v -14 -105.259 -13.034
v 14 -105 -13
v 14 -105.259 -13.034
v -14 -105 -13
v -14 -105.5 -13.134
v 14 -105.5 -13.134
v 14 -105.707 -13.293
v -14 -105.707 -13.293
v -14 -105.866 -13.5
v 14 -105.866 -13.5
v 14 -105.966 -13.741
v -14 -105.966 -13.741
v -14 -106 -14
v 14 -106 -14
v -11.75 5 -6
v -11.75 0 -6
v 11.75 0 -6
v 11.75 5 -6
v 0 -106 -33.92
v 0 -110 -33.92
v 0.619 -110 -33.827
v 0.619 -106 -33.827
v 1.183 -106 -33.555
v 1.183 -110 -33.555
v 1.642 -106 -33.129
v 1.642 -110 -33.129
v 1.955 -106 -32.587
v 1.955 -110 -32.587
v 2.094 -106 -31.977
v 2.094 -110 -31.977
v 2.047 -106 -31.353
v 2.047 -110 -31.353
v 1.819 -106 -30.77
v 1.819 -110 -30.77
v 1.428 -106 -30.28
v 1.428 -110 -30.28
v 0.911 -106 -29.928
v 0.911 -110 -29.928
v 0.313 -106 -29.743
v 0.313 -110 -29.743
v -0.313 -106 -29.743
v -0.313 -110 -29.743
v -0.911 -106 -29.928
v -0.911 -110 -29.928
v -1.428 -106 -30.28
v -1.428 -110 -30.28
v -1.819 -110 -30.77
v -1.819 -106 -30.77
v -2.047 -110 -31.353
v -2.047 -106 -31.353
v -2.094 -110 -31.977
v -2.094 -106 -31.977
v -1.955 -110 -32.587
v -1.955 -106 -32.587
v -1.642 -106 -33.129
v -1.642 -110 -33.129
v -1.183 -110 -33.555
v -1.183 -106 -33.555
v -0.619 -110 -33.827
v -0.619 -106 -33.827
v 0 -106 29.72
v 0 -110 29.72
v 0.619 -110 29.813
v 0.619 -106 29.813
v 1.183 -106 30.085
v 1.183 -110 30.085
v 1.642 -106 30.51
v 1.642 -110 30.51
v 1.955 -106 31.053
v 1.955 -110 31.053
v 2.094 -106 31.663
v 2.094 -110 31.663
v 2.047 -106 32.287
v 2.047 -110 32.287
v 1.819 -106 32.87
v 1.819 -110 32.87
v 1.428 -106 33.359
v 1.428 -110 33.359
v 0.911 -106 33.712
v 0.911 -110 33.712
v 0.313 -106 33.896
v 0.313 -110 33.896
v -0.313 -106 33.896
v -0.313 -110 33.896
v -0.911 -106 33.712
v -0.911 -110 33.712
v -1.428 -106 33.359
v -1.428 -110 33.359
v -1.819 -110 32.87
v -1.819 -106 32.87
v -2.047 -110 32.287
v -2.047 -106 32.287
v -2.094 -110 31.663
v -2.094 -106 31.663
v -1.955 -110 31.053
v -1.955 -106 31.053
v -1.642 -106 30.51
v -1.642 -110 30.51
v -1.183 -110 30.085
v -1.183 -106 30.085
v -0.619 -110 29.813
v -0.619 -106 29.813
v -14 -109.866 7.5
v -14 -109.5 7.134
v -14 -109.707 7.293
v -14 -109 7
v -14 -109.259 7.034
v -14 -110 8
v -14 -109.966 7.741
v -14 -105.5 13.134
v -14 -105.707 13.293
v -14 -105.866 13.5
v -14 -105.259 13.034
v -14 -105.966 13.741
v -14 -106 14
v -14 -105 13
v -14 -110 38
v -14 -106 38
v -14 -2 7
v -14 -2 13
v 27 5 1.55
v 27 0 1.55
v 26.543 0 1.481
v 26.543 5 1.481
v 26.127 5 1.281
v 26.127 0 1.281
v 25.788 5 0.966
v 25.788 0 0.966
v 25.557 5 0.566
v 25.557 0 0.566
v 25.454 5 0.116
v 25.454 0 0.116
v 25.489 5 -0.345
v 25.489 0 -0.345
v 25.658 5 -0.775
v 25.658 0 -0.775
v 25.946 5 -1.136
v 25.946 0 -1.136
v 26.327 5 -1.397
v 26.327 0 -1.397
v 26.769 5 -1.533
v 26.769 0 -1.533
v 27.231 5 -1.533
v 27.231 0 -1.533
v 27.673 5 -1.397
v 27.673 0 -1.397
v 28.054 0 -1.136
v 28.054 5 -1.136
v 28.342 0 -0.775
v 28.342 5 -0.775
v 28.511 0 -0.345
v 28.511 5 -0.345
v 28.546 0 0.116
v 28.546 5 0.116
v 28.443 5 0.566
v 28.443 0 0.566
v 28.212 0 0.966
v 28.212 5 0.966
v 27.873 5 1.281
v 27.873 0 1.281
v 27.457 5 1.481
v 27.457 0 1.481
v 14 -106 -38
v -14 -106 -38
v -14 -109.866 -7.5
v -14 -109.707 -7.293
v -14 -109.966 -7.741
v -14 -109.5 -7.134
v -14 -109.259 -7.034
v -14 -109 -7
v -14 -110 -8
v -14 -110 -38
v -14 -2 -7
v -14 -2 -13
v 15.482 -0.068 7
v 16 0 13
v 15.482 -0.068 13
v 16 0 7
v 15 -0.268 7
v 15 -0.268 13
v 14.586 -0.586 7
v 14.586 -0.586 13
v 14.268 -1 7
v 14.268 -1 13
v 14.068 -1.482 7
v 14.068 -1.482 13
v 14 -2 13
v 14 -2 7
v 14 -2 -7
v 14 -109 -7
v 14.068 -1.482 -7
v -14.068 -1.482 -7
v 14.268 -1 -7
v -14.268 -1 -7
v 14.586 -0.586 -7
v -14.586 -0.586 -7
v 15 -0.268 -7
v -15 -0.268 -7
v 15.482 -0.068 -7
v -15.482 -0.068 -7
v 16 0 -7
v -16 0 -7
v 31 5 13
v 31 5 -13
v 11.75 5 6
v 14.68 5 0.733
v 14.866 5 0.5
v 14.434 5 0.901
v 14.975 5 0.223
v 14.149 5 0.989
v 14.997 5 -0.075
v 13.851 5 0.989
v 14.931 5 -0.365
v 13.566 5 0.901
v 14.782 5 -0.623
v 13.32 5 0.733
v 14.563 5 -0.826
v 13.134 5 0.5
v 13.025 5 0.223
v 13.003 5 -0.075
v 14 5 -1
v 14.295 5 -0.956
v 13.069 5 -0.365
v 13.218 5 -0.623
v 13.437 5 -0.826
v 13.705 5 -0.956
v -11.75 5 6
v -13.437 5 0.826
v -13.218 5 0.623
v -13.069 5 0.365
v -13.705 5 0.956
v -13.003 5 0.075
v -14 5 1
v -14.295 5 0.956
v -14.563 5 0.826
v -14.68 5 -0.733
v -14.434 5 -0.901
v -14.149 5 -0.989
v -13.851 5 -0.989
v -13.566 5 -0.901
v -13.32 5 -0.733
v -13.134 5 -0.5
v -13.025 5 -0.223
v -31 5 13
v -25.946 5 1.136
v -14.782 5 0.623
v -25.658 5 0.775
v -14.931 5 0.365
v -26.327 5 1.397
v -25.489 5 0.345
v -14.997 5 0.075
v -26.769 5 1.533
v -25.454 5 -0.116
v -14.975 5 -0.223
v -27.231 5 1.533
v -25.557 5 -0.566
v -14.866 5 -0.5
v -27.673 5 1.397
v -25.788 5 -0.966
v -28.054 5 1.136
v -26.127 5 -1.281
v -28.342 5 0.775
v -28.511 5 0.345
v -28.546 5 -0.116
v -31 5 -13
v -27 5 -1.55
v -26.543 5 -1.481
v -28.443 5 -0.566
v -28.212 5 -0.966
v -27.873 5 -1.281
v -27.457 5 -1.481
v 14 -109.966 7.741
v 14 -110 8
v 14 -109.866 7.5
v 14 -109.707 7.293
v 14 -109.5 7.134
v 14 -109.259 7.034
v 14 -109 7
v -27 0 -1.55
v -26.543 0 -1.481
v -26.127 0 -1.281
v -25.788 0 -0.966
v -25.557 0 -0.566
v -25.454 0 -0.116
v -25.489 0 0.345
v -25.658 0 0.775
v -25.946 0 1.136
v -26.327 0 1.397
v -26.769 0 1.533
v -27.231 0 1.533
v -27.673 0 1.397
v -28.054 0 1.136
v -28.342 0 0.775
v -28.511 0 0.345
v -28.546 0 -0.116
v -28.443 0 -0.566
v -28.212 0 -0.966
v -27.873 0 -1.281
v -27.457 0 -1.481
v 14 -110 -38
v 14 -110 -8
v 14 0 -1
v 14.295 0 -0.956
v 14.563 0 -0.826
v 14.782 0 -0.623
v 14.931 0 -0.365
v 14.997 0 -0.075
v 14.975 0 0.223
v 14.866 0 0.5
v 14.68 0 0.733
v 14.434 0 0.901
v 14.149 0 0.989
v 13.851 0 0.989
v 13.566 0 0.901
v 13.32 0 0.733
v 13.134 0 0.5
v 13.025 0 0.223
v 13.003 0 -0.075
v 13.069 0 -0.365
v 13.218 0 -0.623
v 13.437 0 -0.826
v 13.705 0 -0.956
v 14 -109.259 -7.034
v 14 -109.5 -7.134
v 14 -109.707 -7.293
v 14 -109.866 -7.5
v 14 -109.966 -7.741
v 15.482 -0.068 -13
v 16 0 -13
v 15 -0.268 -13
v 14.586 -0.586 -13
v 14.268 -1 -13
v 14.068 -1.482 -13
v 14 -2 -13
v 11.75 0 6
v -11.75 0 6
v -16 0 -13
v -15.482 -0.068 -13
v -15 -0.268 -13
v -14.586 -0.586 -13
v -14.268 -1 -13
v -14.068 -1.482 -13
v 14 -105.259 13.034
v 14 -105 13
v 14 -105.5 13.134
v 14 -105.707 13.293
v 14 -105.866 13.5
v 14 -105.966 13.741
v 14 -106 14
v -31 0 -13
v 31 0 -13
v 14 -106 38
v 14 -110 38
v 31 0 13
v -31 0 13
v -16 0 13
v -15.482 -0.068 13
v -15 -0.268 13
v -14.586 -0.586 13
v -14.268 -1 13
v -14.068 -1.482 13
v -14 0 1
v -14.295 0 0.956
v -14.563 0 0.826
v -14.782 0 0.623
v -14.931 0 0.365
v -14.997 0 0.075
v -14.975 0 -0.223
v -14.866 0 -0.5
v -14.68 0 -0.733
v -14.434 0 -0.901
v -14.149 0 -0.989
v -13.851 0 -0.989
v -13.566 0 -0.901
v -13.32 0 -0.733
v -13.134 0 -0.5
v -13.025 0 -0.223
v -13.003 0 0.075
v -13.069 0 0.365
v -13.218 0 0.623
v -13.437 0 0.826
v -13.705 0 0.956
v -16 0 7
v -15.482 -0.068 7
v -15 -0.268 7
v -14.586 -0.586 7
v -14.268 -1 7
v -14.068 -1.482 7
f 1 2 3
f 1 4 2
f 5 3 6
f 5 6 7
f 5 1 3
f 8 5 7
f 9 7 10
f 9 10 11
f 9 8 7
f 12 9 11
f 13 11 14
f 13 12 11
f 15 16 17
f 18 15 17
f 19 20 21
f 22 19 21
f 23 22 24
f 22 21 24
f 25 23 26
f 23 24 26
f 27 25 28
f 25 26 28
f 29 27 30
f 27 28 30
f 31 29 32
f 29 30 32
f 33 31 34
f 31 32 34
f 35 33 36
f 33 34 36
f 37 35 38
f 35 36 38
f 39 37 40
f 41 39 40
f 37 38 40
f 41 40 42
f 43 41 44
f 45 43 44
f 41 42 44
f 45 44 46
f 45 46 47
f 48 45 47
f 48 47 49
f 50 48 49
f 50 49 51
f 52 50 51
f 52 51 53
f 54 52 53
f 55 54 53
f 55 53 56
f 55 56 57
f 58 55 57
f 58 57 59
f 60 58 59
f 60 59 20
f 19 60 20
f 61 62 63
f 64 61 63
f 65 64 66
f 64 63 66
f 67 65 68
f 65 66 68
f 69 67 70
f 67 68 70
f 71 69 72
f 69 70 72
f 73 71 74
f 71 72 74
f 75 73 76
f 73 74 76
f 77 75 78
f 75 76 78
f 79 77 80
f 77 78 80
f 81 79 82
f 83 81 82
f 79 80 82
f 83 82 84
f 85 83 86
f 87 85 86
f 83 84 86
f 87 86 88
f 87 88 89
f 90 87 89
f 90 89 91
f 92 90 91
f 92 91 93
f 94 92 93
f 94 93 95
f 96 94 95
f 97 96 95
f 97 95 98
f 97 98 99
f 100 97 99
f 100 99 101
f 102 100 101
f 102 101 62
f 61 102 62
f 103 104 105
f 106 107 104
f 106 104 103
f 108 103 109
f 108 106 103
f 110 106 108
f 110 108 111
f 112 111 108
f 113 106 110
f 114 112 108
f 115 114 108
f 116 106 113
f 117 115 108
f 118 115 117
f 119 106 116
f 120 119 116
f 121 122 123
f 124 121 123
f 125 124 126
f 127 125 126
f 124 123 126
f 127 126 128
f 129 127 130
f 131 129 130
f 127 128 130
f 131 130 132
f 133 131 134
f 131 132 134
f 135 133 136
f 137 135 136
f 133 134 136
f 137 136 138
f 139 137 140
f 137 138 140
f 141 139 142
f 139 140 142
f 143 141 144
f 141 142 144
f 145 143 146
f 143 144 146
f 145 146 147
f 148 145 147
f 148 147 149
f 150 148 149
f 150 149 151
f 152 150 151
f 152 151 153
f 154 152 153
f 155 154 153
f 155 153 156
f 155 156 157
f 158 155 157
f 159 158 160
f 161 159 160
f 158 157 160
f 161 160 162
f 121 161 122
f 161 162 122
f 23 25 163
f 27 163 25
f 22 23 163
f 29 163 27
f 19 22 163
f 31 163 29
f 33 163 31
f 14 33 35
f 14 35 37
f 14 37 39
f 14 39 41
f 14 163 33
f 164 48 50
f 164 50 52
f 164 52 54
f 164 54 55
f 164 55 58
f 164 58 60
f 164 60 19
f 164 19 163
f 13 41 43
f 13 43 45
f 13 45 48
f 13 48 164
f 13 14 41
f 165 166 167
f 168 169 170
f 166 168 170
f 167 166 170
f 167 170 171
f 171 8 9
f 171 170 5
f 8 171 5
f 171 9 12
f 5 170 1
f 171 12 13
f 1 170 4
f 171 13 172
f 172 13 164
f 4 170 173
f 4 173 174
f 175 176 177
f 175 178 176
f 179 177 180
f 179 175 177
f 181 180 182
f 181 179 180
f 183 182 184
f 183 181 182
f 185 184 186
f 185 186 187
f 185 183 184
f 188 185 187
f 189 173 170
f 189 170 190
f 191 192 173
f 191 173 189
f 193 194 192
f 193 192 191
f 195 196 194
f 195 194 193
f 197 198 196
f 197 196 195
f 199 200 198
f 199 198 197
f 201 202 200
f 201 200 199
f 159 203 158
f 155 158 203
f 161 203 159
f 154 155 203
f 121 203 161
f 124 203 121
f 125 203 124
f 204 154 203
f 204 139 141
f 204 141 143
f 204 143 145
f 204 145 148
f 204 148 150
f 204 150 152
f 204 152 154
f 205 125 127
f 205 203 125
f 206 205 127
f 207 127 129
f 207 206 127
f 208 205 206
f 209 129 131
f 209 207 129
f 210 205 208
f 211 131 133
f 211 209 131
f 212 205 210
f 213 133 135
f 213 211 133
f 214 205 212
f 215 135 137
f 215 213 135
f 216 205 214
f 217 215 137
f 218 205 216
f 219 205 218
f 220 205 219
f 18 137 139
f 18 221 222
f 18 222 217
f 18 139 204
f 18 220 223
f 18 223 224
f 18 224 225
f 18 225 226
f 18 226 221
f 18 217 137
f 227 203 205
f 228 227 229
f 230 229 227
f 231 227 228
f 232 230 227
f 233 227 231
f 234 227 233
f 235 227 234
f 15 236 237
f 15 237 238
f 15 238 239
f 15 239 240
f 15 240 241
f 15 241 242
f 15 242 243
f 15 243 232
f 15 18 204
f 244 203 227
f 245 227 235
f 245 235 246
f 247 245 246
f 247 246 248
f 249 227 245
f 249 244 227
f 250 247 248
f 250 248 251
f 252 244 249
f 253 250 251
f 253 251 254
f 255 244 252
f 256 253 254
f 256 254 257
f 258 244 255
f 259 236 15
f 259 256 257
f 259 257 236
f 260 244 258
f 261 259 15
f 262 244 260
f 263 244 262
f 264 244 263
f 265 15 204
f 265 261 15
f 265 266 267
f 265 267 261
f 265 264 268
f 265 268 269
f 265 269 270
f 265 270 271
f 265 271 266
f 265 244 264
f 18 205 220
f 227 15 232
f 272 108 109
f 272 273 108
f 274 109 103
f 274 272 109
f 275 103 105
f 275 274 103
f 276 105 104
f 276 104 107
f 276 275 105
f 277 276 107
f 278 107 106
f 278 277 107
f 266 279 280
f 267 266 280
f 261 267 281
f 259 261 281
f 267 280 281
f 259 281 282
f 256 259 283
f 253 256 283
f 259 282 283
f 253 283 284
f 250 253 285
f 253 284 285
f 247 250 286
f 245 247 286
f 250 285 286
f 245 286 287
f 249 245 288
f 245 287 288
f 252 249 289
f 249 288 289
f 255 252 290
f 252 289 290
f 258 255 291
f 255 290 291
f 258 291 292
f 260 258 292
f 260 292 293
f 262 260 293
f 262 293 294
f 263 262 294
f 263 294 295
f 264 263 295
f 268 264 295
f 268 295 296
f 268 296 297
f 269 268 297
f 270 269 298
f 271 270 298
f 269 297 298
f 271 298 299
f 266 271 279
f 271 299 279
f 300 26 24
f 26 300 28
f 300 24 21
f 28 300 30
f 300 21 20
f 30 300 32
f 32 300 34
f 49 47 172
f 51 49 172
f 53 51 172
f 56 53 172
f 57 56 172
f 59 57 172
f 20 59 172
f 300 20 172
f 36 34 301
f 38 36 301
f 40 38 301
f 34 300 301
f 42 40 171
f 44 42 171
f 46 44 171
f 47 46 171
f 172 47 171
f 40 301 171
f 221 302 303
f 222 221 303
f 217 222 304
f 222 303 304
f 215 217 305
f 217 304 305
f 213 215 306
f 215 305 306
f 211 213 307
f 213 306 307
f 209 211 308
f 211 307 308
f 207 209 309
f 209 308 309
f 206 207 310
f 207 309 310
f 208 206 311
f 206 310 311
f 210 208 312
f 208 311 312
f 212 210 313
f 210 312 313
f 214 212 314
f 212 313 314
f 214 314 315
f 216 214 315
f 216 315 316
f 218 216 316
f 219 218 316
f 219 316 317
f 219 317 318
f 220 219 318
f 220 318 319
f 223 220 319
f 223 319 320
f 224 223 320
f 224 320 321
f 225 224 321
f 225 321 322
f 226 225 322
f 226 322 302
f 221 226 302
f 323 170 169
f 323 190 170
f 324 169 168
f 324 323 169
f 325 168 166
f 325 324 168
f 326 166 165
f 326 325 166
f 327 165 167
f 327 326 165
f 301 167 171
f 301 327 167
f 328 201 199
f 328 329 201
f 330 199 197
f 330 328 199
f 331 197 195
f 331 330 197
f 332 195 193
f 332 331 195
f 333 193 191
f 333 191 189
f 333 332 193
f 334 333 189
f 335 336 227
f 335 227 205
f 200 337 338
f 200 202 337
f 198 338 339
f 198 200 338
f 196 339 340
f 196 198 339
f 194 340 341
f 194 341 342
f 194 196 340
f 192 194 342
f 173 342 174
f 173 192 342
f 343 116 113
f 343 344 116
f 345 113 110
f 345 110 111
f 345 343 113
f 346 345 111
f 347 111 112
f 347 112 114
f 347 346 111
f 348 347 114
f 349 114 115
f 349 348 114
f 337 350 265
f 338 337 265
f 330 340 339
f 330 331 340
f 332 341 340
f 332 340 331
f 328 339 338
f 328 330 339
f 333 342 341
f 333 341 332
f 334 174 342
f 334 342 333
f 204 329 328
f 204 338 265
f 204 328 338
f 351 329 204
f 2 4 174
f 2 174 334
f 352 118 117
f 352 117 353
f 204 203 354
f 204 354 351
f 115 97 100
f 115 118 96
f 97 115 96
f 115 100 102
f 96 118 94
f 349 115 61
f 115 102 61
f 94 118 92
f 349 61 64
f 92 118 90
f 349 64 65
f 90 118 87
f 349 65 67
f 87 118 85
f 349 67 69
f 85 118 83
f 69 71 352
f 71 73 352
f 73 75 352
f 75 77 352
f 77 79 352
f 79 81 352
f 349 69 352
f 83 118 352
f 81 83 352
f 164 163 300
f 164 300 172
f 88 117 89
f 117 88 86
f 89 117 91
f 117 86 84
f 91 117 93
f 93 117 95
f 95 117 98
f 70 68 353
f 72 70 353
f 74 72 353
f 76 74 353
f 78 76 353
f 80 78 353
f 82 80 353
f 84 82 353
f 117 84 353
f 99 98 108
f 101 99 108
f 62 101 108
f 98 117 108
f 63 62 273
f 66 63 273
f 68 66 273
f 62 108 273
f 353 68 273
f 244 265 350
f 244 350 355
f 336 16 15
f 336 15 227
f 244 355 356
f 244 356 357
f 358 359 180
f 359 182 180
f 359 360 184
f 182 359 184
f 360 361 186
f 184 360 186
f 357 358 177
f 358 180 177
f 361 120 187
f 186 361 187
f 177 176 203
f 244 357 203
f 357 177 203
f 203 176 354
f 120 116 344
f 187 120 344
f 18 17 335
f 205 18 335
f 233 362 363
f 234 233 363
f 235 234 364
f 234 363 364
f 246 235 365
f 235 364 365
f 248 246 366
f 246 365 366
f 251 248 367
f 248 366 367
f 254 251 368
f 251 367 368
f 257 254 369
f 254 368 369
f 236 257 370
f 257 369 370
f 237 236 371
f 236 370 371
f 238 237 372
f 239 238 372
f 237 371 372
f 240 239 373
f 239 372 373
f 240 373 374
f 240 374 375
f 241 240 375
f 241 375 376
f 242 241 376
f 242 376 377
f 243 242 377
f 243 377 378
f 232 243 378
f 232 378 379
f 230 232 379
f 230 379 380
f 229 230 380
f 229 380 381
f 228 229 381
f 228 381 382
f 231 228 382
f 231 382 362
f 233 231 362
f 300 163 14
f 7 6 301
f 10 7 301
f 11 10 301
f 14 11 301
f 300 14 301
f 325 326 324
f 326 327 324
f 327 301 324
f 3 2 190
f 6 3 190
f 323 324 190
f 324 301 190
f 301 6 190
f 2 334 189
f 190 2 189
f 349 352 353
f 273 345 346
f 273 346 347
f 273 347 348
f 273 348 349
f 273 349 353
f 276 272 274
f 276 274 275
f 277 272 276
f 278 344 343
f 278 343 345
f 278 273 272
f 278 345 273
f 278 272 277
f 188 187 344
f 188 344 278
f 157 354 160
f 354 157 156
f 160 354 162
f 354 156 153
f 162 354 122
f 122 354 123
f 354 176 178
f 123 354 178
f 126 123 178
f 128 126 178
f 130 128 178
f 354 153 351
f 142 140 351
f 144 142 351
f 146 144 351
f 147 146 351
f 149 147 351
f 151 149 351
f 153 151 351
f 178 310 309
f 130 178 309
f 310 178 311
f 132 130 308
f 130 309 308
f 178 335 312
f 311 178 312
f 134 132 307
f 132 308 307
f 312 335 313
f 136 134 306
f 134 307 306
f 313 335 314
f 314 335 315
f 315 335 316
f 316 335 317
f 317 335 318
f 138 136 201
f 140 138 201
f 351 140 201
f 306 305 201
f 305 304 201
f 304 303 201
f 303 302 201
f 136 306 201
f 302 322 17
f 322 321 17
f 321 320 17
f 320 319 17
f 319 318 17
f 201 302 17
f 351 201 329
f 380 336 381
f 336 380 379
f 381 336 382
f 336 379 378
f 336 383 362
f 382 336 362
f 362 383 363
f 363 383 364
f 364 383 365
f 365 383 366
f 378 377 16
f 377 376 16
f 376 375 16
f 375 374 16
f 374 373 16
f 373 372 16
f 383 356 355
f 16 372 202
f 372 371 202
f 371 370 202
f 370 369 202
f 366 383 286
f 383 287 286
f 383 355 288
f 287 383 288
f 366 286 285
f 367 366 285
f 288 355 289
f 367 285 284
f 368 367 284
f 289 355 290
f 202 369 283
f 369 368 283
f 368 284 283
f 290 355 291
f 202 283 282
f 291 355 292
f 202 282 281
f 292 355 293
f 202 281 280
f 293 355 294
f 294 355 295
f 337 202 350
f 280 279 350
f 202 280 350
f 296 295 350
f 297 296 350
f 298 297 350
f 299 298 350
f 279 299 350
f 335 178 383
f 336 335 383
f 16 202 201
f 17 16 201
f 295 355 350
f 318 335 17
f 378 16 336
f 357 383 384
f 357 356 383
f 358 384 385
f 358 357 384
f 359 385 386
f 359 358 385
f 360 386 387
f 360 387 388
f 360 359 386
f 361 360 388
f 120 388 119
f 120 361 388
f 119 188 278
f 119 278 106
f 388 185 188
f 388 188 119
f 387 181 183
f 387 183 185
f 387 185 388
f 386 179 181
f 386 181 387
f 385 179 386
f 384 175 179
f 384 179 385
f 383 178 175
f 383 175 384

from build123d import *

# Parameters (mm, degrees)
SKETCH_1_W               = 36
SKETCH_1_H               = 30
EXTRUDE_1_DEPTH          = 5
SKETCH_11_W              = 36
SKETCH_11_H              = 8
EXTRUDE_3_DEPTH          = 110
SKETCH_12_W              = 36
SKETCH_12_H              = 8
EXTRUDE_4_DEPTH          = 4
SKETCH_17_W              = 36
SKETCH_17_H              = 5
EXTRUDE_5_DEPTH          = 8
SKETCH_18_W              = 36
SKETCH_18_H              = 5
EXTRUDE_6_DEPTH          = 8
SKETCH_20_W              = 36
SKETCH_20_H              = 4
EXTRUDE_7_DEPTH          = 15
SKETCH_21_W              = 36
SKETCH_21_H              = 4
EXTRUDE_8_DEPTH          = 15
CUT_EXTRUDE_8_REACH      = 124.446
SKETCH_22_R              = 2.1
CUT_EXTRUDE_9_REACH      = 124.446
SKETCH_23_R              = 1.55
CUT_EXTRUDE_10_REACH     = 119.762
SKETCH_26_R              = 1
SKETCH_26_W              = 23.5
SKETCH_26_H              = 12
CUT_EXTRUDE_11_DEPTH     = 2
CUT_EXTRUDE_12_DEPTH     = 2
CUT_EXTRUDE_13_DEPTH     = 2
CUT_EXTRUDE_14_DEPTH     = 2
SKETCH_32_W              = 28
SKETCH_32_H              = 106
CUT_EXTRUDE_15_DEPTH     = 2
SKETCH_33_W              = 28
SKETCH_33_H              = 106
CUT_EXTRUDE_16_DEPTH     = 2
FILLET_2_R               = 1
EXTRUDE_START            = 2
SKETCH_34_W              = 32
SKETCH_34_H              = 14.000594261
SKETCH_34_R              = 1
SKETCH_34_W_2            = 23.5
SKETCH_34_H_2            = 12
EXTRUDE_12_DEPTH         = 2
CUT_EXTRUDE_START        = -2
CUT_EXTRUDE_17_OUTLINE_R = 1
CUT_EXTRUDE_17_OUTLINE_W = 23.5
CUT_EXTRUDE_17_OUTLINE_H = 12
CUT_EXTRUDE_17_DEPTH     = 2
SKETCH_36_W              = 46
SKETCH_36_H              = 5
EXTRUDE_13_DEPTH         = 15
SKETCH_37_W              = 46
SKETCH_37_H              = 5
EXTRUDE_14_DEPTH         = 15
SKETCH_38_R              = 1.55
CUT_EXTRUDE_18_DEPTH     = 5
CUT_EXTRUDE_19_REACH     = 122.437
SKETCH_39_W              = 62
SKETCH_39_H              = 10
FILLET_3_R               = 2


# Read off the part's stored shape, not the designer's step: 切除-拉伸17
with BuildPart() as part:
    # 草图1 → 凸台-拉伸1 (new body)
    with BuildSketch(Plane(origin=(0, 0, 0), x_dir=(1, 0, 0), z_dir=(0, 1, 0))):
        Rectangle(SKETCH_1_W, SKETCH_1_H)
    extrude(amount=EXTRUDE_1_DEPTH)

    # 草图11 → 凸台-拉伸3 (add)
    with BuildSketch(Plane.XZ):
        with Locations((0, 11)):
            Rectangle(SKETCH_11_W, SKETCH_11_H)
        with Locations((0, -11)):
            Rectangle(SKETCH_11_W, SKETCH_11_H)
    extrude(amount=EXTRUDE_3_DEPTH)

    # 草图12 → 凸台-拉伸4 (add)
    with BuildSketch(Plane.XZ.offset(110)):
        with Locations((0, 19)):
            Rectangle(SKETCH_12_W, SKETCH_12_H)
        with Locations((0, -19)):
            Rectangle(SKETCH_12_W, SKETCH_12_H)
    extrude(amount=-EXTRUDE_4_DEPTH)

    # 草图17 → 凸台-拉伸5 (add)
    with BuildSketch(Plane(origin=(0, 0, -15), x_dir=(-1, 0, 0), z_dir=(0, 0, -1))):
        with Locations((0, 2.5)):
            Rectangle(SKETCH_17_W, SKETCH_17_H)
    extrude(amount=EXTRUDE_5_DEPTH)

    # 草图18 → 凸台-拉伸6 (add)
    with BuildSketch(Plane.XY.offset(15)):
        with Locations((0, 2.5)):
            Rectangle(SKETCH_18_W, SKETCH_18_H)
    extrude(amount=EXTRUDE_6_DEPTH)

    # 草图20 → 凸台-拉伸7 (add)
    with BuildSketch(Plane.XY.offset(23)):
        with Locations((0, -108)):
            Rectangle(SKETCH_20_W, SKETCH_20_H)
    extrude(amount=EXTRUDE_7_DEPTH)

    # 草图21 → 凸台-拉伸8 (add)
    with BuildSketch(Plane(origin=(0, 0, -23), x_dir=(-1, 0, 0), z_dir=(0, 0, -1))):
        with Locations((0, -108)):
            Rectangle(SKETCH_21_W, SKETCH_21_H)
    extrude(amount=EXTRUDE_8_DEPTH)

    # 草图22 → 切除-拉伸8 (cut, up to next)
    with BuildSketch(Plane.XZ.offset(110), mode=Mode.PRIVATE) as cut_extrude_8_sk1:
        with Locations(Location((0, 31.819805155, 0), (0, 0, 270))):
            Circle(SKETCH_22_R)
    cut_extrude_8_tool1 = extrude(cut_extrude_8_sk1.sketch, amount=-CUT_EXTRUDE_8_REACH, mode=Mode.PRIVATE) & part.part
    # 草图22 → 切除-拉伸8 (cut, up to next)
    with BuildSketch(Plane.XZ.offset(110), mode=Mode.PRIVATE) as cut_extrude_8_sk2:
        with Locations(Location((0, -31.819805155, 0), (0, 0, 270))):
            Circle(SKETCH_22_R)
    cut_extrude_8_tool2 = extrude(cut_extrude_8_sk2.sketch, amount=-CUT_EXTRUDE_8_REACH, mode=Mode.PRIVATE) & part.part
    add(cut_extrude_8_tool1.solids().sort_by_distance((0, -110, 31.819805))[0], mode=Mode.SUBTRACT)
    add(cut_extrude_8_tool2.solids().sort_by_distance((0, -110, -31.819805))[0], mode=Mode.SUBTRACT)

    # 草图23 → 切除-拉伸9 (cut, up to next)
    with BuildSketch(Plane(origin=(0, 5, 0), x_dir=(1, 0, 0), z_dir=(0, 1, 0)), mode=Mode.PRIVATE) as cut_extrude_9_sk1:
        with Locations(Location((0, 18, 0), (0, 0, 270))):
            Circle(SKETCH_23_R)
    cut_extrude_9_tool1 = extrude(cut_extrude_9_sk1.sketch, amount=-CUT_EXTRUDE_9_REACH, mode=Mode.PRIVATE) & part.part
    # 草图23 → 切除-拉伸9 (cut, up to next)
    with BuildSketch(Plane(origin=(0, 5, 0), x_dir=(1, 0, 0), z_dir=(0, 1, 0)), mode=Mode.PRIVATE) as cut_extrude_9_sk2:
        with Locations(Location((0, -18, 0), (0, 0, 270))):
            Circle(SKETCH_23_R)
    cut_extrude_9_tool2 = extrude(cut_extrude_9_sk2.sketch, amount=-CUT_EXTRUDE_9_REACH, mode=Mode.PRIVATE) & part.part
    add(cut_extrude_9_tool1.solids().sort_by_distance((0, 5, -18))[0], mode=Mode.SUBTRACT)
    add(cut_extrude_9_tool2.solids().sort_by_distance((0, 5, 18))[0], mode=Mode.SUBTRACT)

    # 草图26 → 切除-拉伸10 (cut, up to next)
    with BuildSketch(Plane(origin=(0, 0, 0), x_dir=(-1, 0, 0), z_dir=(0, -1, 0)), mode=Mode.PRIVATE) as cut_extrude_10_sk1:
        with Locations(Location((-14, 0, 0), (0, 0, 90))):
            Circle(SKETCH_26_R)
    cut_extrude_10_tool1 = extrude(cut_extrude_10_sk1.sketch, amount=-CUT_EXTRUDE_10_REACH, mode=Mode.PRIVATE) & part.part
    # 草图26 → 切除-拉伸10 (cut, up to next)
    with BuildSketch(Plane(origin=(0, 0, 0), x_dir=(-1, 0, 0), z_dir=(0, -1, 0)), mode=Mode.PRIVATE) as cut_extrude_10_sk2:
        with Locations(Location((14, 0, 0), (0, 0, 270))):
            Circle(SKETCH_26_R)
    cut_extrude_10_tool2 = extrude(cut_extrude_10_sk2.sketch, amount=-CUT_EXTRUDE_10_REACH, mode=Mode.PRIVATE) & part.part
    # 草图26 → 切除-拉伸10 (cut, up to next)
    with BuildSketch(Plane(origin=(0, 0, 0), x_dir=(-1, 0, 0), z_dir=(0, -1, 0)), mode=Mode.PRIVATE) as cut_extrude_10_sk3:
        Rectangle(SKETCH_26_W, SKETCH_26_H)
    cut_extrude_10_tool3 = extrude(cut_extrude_10_sk3.sketch, amount=-CUT_EXTRUDE_10_REACH, mode=Mode.PRIVATE) & part.part
    add(cut_extrude_10_tool1.solids().sort_by_distance((14, 0, 0))[0], mode=Mode.SUBTRACT)
    add(cut_extrude_10_tool2.solids().sort_by_distance((-14, 0, 0))[0], mode=Mode.SUBTRACT)
    add(cut_extrude_10_tool3.solids().sort_by_distance((0, 0, 0))[0], mode=Mode.SUBTRACT)

    # 草图28 → 切除-拉伸11 (cut)
    with BuildSketch(Plane(origin=(18, 0, 0), x_dir=(0, 0, -1), z_dir=(1, 0, 0))):
        Polygon((23, 5), (-23, 5), (-23, 0), (-15, 0), (-15, -106), (-38, -106), (-38, -110), (-7, -110), (-7, 0), (7, 0), (7, -110), (38, -110), (38, -106), (15, -106), (15, 0), (23, 0), align=None)
    extrude(amount=-CUT_EXTRUDE_11_DEPTH, mode=Mode.SUBTRACT)

    # 草图29 → 切除-拉伸12 (cut)
    with BuildSketch(Plane.ZY.offset(18)):
        Polygon((23, 5), (-23, 5), (-23, 0), (-15, 0), (-15, -106), (-38, -106), (-38, -110), (-7, -110), (-7, 0), (7, 0), (7, -110), (38, -110), (38, -106), (15, -106), (15, 0), (23, 0), align=None)
    extrude(amount=-CUT_EXTRUDE_12_DEPTH, mode=Mode.SUBTRACT)

    # 草图30 → 切除-拉伸13 (cut)
    with BuildSketch(Plane(origin=(16, 0, 0), x_dir=(0, 0, -1), z_dir=(1, 0, 0))):
        Polygon((-15, 0), (-7, 0), (-7, -110), (-38, -110), (-38, -106), (-15, -106), align=None)
        Polygon((7, 0), (15, 0), (15, -106), (38, -106), (38, -110), (7, -110), align=None)
    extrude(amount=-CUT_EXTRUDE_13_DEPTH, mode=Mode.SUBTRACT)

    # 草图31 → 切除-拉伸14 (cut)
    with BuildSketch(Plane.ZY.offset(16)):
        Polygon((-7, 0), (-7, -110), (-38, -110), (-38, -106), (-15, -106), (-15, 0), align=None)
        Polygon((15, 0), (15, -106), (38, -106), (38, -110), (7, -110), (7, 0), align=None)
    extrude(amount=-CUT_EXTRUDE_14_DEPTH, mode=Mode.SUBTRACT)

    # 草图32 → 切除-拉伸15 (cut)
    with BuildSketch(Plane.XY.offset(15)):
        with Locations((0, -53)):
            Rectangle(SKETCH_32_W, SKETCH_32_H)
    extrude(amount=-CUT_EXTRUDE_15_DEPTH, mode=Mode.SUBTRACT)

    # 草图33 → 切除-拉伸16 (cut)
    with BuildSketch(Plane(origin=(0, 0, -15), x_dir=(-1, 0, 0), z_dir=(0, 0, -1))):
        with Locations((0, -53)):
            Rectangle(SKETCH_33_W, SKETCH_33_H)
    extrude(amount=-CUT_EXTRUDE_16_DEPTH, mode=Mode.SUBTRACT)

    # 圆角2
    fillet_2_edges = [part.edges().sort_by_distance(p)[0] for p in [
        (0, -110, -7),
        (0, -110, 7),
        (0, -106, 13),
        (0, -106, -13),
    ]]
    fillet(fillet_2_edges, radius=FILLET_2_R)

    # 草图34 → 凸台-拉伸12 (add)
    with BuildSketch(Plane.XZ.offset(EXTRUDE_START)):
        with Locations((0, 0.000297131)):
            Rectangle(SKETCH_34_W, SKETCH_34_H)
        with Locations(Location((14, 0, 0), (0, 0, 270))):
            Circle(SKETCH_34_R, mode=Mode.SUBTRACT)
        with Locations(Location((-14, 0, 0), (0, 0, 270))):
            Circle(SKETCH_34_R, mode=Mode.SUBTRACT)
        Rectangle(SKETCH_34_W_2, SKETCH_34_H_2, mode=Mode.SUBTRACT)
    extrude(amount=-EXTRUDE_12_DEPTH)

    # 切除-拉伸17 outline → 切除-拉伸17 (cut)
    with BuildSketch(Plane.XZ.offset(2).offset(CUT_EXTRUDE_START)):
        Polygon((-16, -7), (16, -7), (16, 7.000594261), (14, 7.000594261), (14, 7), (-14, 7), (-14, 7.000594261), (-16, 7.000594261), align=None)
        with Locations((-14, 0)):
            Circle(CUT_EXTRUDE_17_OUTLINE_R, mode=Mode.SUBTRACT)
        Rectangle(CUT_EXTRUDE_17_OUTLINE_W, CUT_EXTRUDE_17_OUTLINE_H, mode=Mode.SUBTRACT)
        with Locations((14, 0)):
            Circle(CUT_EXTRUDE_17_OUTLINE_R, mode=Mode.SUBTRACT)
    extrude(amount=CUT_EXTRUDE_17_DEPTH, mode=Mode.SUBTRACT)

    # 草图36 → 凸台-拉伸13 (add)
    with BuildSketch(Plane.ZY.offset(16)):
        with Locations((0, 2.5)):
            Rectangle(SKETCH_36_W, SKETCH_36_H)
    extrude(amount=EXTRUDE_13_DEPTH)

    # 草图37 → 凸台-拉伸14 (add)
    with BuildSketch(Plane(origin=(16, 0, 0), x_dir=(0, 0, -1), z_dir=(1, 0, 0))):
        with Locations((0, 2.5)):
            Rectangle(SKETCH_37_W, SKETCH_37_H)
    extrude(amount=EXTRUDE_14_DEPTH)

    # 草图38 → 切除-拉伸18 (cut)
    with BuildSketch(Plane.XZ):
        with Locations(Location((-27, 0, 0), (0, 0, 270))):
            Circle(SKETCH_38_R)
        with Locations(Location((27, 0, 0), (0, 0, 90))):
            Circle(SKETCH_38_R)
    extrude(amount=-CUT_EXTRUDE_18_DEPTH, mode=Mode.SUBTRACT)

    # 草图39 → 切除-拉伸19 (cut, up to next)
    with BuildSketch(Plane.XZ, mode=Mode.PRIVATE) as cut_extrude_19_sk1:
        with Locations((0, 18)):
            Rectangle(SKETCH_39_W, SKETCH_39_H)
    cut_extrude_19_tool1 = extrude(cut_extrude_19_sk1.sketch, amount=-CUT_EXTRUDE_19_REACH, mode=Mode.PRIVATE) & part.part
    # 草图39 → 切除-拉伸19 (cut, up to next)
    with BuildSketch(Plane.XZ, mode=Mode.PRIVATE) as cut_extrude_19_sk2:
        with Locations((0, -18)):
            Rectangle(SKETCH_39_W, SKETCH_39_H)
    cut_extrude_19_tool2 = extrude(cut_extrude_19_sk2.sketch, amount=-CUT_EXTRUDE_19_REACH, mode=Mode.PRIVATE) & part.part
    add(cut_extrude_19_tool1.solids().sort_by_distance((0, 0, 18))[0], mode=Mode.SUBTRACT)
    add(cut_extrude_19_tool2.solids().sort_by_distance((0, 0, -18))[0], mode=Mode.SUBTRACT)

    # 圆角3
    fillet_3_edges = [part.edges().sort_by_distance(p)[0] for p in [
        (-14, 0, -10),
        (-14, 0, 10),
        (14, 0, -10),
        (14, 0, 10),
    ]]
    fillet(fillet_3_edges, radius=FILLET_3_R)


solid = part.part
